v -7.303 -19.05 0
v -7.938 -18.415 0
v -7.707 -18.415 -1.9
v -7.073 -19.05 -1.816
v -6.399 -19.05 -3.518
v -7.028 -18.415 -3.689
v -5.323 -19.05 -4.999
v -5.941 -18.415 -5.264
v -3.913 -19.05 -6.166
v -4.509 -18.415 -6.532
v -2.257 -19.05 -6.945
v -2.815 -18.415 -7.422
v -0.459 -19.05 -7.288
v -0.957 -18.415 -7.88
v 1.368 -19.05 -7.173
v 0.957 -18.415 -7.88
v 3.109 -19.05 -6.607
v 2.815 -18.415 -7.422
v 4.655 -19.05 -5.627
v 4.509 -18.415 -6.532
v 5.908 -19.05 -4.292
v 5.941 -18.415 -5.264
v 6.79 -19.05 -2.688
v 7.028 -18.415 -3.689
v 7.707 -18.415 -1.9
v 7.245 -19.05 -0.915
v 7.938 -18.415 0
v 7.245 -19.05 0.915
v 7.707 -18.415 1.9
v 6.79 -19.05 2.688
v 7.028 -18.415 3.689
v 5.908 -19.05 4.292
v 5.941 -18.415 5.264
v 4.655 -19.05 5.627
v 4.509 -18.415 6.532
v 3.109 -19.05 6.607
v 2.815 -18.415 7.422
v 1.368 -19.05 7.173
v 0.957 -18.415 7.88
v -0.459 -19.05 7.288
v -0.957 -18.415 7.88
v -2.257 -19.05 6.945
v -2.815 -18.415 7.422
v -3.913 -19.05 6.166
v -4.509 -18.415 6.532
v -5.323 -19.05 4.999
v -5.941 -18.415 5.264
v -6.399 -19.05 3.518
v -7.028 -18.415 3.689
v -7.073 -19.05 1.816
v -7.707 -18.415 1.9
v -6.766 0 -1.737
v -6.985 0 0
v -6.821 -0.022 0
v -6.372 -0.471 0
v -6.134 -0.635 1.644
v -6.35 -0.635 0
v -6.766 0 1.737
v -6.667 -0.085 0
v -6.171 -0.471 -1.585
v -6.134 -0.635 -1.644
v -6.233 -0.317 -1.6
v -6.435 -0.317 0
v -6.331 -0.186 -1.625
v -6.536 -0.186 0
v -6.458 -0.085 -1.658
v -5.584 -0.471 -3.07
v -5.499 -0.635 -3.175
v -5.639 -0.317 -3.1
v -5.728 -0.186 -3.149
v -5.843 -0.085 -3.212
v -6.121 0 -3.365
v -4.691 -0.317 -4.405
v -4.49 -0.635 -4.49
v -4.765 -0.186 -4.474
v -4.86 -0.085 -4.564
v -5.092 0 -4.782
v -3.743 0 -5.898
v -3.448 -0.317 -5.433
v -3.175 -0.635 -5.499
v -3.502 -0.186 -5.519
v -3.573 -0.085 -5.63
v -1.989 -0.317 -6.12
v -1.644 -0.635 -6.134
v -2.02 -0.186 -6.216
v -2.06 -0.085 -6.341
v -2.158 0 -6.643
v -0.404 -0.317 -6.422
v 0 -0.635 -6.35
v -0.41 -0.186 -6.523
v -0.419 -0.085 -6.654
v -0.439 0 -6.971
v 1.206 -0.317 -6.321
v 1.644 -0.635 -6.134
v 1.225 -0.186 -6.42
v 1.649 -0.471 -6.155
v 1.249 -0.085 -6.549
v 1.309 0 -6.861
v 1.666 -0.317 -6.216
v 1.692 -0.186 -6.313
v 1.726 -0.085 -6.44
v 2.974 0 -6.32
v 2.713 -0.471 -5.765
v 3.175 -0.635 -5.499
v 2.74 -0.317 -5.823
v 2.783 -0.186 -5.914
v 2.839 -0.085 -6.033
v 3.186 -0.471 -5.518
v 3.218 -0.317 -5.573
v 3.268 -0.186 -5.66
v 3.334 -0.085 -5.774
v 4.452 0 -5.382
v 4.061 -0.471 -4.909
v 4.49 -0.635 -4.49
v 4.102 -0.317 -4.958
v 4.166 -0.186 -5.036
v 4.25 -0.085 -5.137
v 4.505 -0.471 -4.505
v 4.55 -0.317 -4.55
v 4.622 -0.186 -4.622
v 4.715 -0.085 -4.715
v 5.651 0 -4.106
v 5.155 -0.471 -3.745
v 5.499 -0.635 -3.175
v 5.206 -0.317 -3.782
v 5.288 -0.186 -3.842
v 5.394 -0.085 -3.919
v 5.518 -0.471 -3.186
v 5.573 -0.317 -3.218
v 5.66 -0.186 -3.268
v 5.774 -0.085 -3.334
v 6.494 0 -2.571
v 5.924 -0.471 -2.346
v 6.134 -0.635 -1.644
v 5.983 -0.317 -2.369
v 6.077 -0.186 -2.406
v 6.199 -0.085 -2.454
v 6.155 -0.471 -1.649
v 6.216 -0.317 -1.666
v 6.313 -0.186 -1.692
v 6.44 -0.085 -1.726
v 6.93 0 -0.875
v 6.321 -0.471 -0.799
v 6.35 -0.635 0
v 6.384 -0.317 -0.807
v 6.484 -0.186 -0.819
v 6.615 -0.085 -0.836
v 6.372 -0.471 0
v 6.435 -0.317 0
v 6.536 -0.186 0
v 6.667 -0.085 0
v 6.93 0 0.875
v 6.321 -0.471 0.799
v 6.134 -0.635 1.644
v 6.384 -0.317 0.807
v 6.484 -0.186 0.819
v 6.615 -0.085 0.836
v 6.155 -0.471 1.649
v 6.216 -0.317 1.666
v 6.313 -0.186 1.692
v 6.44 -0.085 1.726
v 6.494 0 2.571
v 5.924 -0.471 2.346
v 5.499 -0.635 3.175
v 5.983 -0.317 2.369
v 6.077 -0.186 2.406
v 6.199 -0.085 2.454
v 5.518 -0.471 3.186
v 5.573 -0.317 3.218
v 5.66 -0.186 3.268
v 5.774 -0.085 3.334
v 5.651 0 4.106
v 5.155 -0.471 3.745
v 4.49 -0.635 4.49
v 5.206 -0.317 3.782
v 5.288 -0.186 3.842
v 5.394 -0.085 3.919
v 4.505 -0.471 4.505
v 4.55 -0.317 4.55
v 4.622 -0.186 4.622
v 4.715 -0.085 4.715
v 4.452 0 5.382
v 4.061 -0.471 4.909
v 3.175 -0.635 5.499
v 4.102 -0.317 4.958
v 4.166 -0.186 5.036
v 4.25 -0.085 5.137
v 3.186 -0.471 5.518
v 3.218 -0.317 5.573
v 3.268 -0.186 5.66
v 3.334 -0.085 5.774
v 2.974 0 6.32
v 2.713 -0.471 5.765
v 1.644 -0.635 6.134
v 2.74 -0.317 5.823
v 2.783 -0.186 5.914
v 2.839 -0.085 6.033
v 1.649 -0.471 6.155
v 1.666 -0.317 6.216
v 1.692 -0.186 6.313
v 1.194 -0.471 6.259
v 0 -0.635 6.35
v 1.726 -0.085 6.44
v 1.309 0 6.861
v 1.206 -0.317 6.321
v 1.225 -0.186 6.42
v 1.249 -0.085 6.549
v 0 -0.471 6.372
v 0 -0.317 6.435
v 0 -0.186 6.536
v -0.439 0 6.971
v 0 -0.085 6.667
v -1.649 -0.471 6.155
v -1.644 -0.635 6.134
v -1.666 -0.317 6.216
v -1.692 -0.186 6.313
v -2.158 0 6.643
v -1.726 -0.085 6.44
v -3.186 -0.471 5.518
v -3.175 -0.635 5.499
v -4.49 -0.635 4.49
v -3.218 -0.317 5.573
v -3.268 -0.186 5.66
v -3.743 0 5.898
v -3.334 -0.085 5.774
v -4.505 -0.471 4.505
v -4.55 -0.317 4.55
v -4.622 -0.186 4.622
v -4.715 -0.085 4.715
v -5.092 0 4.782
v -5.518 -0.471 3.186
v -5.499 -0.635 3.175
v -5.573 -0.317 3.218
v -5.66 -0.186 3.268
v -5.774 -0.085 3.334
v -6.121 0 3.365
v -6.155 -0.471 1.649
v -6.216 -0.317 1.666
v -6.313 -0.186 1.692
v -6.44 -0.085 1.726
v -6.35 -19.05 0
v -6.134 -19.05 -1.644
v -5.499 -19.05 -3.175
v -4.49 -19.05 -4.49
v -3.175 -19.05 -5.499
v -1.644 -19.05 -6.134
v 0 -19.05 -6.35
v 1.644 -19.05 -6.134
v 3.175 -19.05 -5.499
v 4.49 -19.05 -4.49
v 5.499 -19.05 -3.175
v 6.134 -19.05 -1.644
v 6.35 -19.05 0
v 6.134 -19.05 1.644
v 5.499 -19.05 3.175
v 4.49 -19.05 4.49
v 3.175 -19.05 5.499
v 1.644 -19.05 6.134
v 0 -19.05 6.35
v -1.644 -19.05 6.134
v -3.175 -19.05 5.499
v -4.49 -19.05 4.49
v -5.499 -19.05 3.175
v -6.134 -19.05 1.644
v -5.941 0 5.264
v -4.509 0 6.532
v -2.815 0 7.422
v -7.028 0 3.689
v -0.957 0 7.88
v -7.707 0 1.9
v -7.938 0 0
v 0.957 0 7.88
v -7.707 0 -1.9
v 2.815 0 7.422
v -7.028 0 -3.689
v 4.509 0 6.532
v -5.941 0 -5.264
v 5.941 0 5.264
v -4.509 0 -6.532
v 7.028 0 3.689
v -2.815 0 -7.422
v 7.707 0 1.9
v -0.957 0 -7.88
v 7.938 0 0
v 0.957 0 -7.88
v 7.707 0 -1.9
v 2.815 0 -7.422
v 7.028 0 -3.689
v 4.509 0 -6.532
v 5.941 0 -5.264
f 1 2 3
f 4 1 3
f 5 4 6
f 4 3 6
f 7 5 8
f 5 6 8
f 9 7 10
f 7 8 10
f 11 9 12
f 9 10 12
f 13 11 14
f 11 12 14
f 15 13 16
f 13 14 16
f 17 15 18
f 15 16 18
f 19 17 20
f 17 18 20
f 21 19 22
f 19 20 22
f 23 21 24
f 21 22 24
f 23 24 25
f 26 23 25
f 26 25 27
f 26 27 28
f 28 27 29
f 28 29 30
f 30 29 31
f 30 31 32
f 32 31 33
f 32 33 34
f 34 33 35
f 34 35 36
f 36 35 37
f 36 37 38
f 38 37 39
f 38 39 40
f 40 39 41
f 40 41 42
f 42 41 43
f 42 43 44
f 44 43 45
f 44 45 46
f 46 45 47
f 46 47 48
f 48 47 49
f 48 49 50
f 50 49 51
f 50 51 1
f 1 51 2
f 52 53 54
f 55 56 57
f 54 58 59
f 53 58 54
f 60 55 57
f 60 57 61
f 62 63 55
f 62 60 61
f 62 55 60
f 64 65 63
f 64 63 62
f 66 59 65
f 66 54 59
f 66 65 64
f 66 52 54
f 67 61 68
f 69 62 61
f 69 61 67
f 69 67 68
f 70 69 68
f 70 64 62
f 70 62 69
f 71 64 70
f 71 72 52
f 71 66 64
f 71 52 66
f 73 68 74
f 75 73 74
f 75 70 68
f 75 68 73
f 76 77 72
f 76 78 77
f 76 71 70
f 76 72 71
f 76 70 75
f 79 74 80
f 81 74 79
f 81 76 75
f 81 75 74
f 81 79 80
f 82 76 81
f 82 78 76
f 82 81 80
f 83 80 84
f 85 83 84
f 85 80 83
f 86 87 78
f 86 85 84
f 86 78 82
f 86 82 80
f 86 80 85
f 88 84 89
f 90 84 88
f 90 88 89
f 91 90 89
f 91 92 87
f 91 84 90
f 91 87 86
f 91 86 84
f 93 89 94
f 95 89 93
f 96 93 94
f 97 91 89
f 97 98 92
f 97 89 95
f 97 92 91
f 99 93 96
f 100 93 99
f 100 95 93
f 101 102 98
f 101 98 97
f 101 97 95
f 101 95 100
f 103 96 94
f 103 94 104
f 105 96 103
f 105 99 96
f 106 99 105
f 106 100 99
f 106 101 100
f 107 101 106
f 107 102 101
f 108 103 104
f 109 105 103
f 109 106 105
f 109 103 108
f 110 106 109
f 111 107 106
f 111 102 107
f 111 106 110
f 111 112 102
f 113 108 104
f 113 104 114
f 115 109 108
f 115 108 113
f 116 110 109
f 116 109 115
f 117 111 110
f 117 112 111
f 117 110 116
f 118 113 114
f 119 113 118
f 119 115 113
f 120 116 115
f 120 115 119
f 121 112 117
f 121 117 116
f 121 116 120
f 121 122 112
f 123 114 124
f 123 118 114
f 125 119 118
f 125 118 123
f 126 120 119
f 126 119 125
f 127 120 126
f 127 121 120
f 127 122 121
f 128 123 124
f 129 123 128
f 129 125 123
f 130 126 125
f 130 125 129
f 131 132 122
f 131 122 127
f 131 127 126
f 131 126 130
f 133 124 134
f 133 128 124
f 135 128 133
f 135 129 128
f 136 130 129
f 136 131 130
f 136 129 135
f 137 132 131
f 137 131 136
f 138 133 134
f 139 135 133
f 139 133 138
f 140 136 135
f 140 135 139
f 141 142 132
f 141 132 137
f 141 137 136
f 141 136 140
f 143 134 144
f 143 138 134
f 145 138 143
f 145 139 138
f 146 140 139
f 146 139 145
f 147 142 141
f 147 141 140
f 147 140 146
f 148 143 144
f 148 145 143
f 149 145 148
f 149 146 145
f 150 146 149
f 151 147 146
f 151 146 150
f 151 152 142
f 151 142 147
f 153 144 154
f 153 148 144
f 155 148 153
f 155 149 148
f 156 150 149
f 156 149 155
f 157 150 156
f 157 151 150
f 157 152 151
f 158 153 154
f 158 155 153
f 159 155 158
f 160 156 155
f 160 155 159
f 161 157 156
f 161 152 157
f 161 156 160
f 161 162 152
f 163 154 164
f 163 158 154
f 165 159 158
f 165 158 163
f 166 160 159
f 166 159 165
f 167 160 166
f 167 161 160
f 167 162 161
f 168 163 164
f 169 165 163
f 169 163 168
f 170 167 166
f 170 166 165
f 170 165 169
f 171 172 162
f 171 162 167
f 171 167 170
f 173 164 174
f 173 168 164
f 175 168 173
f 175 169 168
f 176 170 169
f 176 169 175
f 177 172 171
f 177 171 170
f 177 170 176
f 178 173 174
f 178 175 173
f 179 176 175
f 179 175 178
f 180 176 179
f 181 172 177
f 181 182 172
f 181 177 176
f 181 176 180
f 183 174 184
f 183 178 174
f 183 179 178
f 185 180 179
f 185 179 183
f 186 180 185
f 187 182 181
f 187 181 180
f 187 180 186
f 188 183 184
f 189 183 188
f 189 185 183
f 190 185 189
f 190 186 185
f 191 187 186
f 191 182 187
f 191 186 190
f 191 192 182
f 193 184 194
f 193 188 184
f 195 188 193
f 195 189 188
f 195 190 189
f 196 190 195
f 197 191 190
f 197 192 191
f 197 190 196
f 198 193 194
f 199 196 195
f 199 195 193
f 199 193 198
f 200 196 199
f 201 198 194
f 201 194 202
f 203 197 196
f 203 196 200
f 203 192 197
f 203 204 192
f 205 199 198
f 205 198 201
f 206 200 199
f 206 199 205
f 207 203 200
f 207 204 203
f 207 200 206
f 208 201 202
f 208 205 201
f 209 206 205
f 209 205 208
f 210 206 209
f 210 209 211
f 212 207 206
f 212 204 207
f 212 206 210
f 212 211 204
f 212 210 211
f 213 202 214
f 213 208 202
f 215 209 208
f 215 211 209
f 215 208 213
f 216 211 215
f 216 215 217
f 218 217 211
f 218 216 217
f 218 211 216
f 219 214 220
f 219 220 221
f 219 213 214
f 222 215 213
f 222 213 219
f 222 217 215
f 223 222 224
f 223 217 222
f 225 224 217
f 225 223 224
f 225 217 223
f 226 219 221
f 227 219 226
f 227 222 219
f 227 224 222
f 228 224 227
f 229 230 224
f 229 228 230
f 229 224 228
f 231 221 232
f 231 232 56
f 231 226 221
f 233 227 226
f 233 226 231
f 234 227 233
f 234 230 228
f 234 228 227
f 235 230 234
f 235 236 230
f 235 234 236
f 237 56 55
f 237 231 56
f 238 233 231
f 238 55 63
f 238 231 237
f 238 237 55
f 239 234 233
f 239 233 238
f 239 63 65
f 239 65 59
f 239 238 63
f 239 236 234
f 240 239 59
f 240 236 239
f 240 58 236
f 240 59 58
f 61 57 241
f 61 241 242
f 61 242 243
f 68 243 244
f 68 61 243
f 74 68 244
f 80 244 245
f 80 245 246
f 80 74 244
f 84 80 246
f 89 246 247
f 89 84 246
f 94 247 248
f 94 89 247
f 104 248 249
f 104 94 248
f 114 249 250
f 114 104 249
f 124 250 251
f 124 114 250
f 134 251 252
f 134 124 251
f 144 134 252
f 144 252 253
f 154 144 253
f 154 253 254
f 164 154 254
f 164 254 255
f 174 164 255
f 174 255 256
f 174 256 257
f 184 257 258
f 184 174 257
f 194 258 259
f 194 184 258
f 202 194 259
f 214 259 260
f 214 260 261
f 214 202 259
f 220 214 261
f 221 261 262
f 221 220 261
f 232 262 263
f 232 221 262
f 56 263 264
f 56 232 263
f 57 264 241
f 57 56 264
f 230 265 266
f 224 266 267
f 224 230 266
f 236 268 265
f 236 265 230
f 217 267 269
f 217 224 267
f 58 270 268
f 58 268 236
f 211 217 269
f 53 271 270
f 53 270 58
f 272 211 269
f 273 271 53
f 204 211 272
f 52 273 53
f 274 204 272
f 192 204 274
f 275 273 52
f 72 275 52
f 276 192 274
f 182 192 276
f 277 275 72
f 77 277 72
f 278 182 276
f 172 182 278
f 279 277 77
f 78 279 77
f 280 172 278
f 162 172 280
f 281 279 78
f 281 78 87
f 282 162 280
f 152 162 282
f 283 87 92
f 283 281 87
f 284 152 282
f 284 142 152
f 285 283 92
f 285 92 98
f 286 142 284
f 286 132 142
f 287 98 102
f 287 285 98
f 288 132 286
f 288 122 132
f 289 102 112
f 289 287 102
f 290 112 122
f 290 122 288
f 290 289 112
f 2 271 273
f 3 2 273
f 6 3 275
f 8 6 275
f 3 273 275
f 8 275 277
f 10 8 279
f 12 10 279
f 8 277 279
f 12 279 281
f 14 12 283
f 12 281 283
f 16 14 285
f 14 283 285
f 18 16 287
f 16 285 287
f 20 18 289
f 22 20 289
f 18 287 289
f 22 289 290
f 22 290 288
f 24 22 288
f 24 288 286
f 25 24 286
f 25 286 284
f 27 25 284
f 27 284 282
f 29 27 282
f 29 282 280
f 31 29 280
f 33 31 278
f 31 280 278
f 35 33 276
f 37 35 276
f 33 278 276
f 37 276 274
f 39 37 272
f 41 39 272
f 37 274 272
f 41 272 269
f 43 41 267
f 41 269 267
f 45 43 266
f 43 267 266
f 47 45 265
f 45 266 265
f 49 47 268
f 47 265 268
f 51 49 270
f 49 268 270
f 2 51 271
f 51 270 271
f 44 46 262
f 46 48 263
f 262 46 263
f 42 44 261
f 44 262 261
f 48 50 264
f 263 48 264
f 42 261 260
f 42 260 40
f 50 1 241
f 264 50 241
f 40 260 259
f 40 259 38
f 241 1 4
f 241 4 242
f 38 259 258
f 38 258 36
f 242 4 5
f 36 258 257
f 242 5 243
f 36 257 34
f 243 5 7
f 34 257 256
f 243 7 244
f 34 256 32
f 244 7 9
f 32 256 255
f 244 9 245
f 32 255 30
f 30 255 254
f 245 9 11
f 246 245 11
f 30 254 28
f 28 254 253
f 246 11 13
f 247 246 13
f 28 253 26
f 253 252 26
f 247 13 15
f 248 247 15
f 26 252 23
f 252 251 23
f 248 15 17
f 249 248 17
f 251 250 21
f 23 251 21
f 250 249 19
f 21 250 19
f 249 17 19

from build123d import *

# Parameters (mm, degrees)
BODY_SECTION_W      = 1.5875
BODY_SECTION_H      = 19.05
TOP_RADIUS_R        = 0.635
BOTTOM_CHAMFER_SIZE = 0.635


with BuildPart() as part:
    # BODY SECTION → BODY (revolve)
    with BuildSketch(Plane.XY, mode=Mode.PRIVATE) as body_sk:
        with Locations((7.14375, -9.525)):
            Rectangle(BODY_SECTION_W, BODY_SECTION_H)
    revolve(body_sk.sketch.rotate(Axis((0, 0, 0), (0, -1, 0)), 180), axis=Axis((0, 0, 0), (0, -1, 0)))

    # TOP RADIUS
    top_radius_edges = [part.edges().sort_by_distance(p)[0] for p in [
        (6.35, 0, 0),
    ]]
    fillet(top_radius_edges, radius=TOP_RADIUS_R)

    # BOTTOM CHAMFER
    bottom_chamfer_edges = [part.edges().sort_by_distance(p)[0] for p in [
        (7.9375, -19.05, 0),
    ]]
    chamfer(bottom_chamfer_edges, length=BOTTOM_CHAMFER_SIZE)


solid = part.part
